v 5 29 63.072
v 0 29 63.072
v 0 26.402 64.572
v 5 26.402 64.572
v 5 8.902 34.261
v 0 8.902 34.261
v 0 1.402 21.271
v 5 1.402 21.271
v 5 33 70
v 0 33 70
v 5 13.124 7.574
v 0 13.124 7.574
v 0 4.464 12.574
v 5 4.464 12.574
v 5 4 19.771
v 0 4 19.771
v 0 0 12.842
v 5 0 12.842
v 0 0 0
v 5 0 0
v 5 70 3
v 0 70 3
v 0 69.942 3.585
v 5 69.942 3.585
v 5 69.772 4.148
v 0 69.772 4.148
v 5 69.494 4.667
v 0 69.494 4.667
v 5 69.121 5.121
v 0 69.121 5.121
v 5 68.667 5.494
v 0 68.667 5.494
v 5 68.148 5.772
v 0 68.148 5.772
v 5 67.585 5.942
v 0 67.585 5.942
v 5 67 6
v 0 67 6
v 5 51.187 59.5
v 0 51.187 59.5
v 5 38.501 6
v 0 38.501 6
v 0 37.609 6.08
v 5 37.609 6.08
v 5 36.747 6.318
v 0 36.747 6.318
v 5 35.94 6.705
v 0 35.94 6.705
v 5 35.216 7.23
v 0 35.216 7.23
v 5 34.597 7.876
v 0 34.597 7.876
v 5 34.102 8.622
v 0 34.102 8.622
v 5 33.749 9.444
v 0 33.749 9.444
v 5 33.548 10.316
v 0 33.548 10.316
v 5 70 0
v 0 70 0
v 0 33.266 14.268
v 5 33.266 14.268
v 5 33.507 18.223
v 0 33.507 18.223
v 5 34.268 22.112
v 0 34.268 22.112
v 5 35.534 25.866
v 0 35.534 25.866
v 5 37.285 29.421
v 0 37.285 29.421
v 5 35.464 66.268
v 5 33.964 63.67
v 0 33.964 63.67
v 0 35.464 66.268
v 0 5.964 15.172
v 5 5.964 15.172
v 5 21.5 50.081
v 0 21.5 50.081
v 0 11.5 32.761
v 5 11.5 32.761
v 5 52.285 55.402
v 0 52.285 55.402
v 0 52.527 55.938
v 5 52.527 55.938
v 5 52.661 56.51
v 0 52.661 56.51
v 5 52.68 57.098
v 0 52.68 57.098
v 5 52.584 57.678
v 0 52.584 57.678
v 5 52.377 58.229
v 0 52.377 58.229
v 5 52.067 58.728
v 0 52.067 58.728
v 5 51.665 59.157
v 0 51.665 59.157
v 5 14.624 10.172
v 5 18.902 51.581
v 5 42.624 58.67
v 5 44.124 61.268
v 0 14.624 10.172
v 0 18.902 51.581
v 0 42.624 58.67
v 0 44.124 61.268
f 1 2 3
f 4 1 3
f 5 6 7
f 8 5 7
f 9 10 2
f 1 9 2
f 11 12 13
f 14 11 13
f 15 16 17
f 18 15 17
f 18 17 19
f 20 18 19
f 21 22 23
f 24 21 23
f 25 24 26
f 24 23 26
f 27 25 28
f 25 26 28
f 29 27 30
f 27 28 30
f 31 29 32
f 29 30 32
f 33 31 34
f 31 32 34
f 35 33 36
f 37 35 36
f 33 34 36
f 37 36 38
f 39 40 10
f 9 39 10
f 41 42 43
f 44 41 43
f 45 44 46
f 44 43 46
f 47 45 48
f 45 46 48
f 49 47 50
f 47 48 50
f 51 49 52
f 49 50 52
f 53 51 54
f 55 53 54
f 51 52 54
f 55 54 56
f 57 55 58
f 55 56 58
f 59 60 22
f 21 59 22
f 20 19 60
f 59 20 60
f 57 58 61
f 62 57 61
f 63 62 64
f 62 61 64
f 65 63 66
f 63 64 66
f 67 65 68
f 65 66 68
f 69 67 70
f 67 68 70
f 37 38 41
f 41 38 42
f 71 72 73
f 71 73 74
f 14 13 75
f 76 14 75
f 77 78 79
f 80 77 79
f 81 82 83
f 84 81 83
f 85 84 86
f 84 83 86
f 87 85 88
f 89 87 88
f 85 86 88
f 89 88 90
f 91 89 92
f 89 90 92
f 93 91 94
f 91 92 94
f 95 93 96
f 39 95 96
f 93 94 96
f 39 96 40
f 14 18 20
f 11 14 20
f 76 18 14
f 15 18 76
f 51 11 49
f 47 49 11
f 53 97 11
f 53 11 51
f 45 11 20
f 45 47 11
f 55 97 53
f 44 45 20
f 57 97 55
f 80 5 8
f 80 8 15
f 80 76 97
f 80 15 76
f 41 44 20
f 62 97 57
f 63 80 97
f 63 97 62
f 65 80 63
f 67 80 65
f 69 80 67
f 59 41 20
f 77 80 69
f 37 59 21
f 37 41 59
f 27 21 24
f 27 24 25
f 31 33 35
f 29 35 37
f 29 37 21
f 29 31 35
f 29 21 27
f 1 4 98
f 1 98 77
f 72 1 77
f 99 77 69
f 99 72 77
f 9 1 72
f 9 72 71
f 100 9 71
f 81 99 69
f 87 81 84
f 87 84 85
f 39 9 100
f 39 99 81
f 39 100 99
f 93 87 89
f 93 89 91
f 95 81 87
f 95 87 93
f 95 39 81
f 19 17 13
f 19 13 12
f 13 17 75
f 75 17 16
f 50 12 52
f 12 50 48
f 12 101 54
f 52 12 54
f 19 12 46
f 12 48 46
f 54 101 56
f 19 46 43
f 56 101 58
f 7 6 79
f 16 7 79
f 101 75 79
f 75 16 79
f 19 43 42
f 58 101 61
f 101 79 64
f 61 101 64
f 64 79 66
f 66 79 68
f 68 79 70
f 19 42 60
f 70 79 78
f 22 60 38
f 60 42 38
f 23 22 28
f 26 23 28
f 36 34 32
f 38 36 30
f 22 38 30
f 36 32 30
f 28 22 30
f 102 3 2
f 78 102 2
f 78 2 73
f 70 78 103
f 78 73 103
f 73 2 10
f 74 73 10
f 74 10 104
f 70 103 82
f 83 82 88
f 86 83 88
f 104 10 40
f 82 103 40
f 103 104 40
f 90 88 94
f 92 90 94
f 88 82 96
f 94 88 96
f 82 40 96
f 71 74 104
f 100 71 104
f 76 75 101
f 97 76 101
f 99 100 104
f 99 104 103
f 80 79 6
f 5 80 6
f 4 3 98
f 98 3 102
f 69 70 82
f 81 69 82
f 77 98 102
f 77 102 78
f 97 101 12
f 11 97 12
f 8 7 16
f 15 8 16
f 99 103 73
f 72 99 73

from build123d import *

# Parameters (mm, degrees)
F1_DEPTH = 5


with BuildPart() as f1:
    # F0 (on Right) → F1 (new body)
    with BuildSketch(Plane.YZ):
        with BuildLine():
            Line((4, 19.770527), (0, 12.842323))
            Line((0, 12.842323), (0, 0))
            Line((0, 0), (70, 0))
            Line((70, 0), (70, 3))
            ThreePointArc((70, 3), (69.12132, 5.12132), (67, 6))
            Line((67, 6), (38.500565, 6))
            ThreePointArc((38.500565, 6), (35.21584, 7.230308), (33.547604, 10.315768))
            ThreePointArc((33.547604, 10.315768), (33.8233, 20.180017), (37.28461, 29.421162))
            Line((37.28461, 29.421162), (52.28461, 55.401924))
            ThreePointArc((52.28461, 55.401924), (52.584311, 57.678381), (51.186533, 59.5))
            Line((51.186533, 59.5), (33, 70))
            Line((33, 70), (29, 63.071797))
            Line((29, 63.071797), (26.401924, 64.571797))
            Line((26.401924, 64.571797), (18.901924, 51.581416))
            Line((18.901924, 51.581416), (21.5, 50.081416))
            Line((21.5, 50.081416), (11.5, 32.760908))
            Line((11.5, 32.760908), (8.901924, 34.260908))
            Line((8.901924, 34.260908), (1.401924, 21.270527))
            Line((1.401924, 21.270527), (4, 19.770527))
        make_face()
        Polygon((4.464102, 12.574374), (5.964102, 15.17245), (14.624356, 10.17245), (13.124356, 7.574374), align=None, mode=Mode.SUBTRACT)
        Polygon((33.964102, 63.669873), (35.464102, 66.267949), (44.124356, 61.267949), (42.624356, 58.669873), align=None, mode=Mode.SUBTRACT)
    extrude(amount=F1_DEPTH)


solid = f1.part
